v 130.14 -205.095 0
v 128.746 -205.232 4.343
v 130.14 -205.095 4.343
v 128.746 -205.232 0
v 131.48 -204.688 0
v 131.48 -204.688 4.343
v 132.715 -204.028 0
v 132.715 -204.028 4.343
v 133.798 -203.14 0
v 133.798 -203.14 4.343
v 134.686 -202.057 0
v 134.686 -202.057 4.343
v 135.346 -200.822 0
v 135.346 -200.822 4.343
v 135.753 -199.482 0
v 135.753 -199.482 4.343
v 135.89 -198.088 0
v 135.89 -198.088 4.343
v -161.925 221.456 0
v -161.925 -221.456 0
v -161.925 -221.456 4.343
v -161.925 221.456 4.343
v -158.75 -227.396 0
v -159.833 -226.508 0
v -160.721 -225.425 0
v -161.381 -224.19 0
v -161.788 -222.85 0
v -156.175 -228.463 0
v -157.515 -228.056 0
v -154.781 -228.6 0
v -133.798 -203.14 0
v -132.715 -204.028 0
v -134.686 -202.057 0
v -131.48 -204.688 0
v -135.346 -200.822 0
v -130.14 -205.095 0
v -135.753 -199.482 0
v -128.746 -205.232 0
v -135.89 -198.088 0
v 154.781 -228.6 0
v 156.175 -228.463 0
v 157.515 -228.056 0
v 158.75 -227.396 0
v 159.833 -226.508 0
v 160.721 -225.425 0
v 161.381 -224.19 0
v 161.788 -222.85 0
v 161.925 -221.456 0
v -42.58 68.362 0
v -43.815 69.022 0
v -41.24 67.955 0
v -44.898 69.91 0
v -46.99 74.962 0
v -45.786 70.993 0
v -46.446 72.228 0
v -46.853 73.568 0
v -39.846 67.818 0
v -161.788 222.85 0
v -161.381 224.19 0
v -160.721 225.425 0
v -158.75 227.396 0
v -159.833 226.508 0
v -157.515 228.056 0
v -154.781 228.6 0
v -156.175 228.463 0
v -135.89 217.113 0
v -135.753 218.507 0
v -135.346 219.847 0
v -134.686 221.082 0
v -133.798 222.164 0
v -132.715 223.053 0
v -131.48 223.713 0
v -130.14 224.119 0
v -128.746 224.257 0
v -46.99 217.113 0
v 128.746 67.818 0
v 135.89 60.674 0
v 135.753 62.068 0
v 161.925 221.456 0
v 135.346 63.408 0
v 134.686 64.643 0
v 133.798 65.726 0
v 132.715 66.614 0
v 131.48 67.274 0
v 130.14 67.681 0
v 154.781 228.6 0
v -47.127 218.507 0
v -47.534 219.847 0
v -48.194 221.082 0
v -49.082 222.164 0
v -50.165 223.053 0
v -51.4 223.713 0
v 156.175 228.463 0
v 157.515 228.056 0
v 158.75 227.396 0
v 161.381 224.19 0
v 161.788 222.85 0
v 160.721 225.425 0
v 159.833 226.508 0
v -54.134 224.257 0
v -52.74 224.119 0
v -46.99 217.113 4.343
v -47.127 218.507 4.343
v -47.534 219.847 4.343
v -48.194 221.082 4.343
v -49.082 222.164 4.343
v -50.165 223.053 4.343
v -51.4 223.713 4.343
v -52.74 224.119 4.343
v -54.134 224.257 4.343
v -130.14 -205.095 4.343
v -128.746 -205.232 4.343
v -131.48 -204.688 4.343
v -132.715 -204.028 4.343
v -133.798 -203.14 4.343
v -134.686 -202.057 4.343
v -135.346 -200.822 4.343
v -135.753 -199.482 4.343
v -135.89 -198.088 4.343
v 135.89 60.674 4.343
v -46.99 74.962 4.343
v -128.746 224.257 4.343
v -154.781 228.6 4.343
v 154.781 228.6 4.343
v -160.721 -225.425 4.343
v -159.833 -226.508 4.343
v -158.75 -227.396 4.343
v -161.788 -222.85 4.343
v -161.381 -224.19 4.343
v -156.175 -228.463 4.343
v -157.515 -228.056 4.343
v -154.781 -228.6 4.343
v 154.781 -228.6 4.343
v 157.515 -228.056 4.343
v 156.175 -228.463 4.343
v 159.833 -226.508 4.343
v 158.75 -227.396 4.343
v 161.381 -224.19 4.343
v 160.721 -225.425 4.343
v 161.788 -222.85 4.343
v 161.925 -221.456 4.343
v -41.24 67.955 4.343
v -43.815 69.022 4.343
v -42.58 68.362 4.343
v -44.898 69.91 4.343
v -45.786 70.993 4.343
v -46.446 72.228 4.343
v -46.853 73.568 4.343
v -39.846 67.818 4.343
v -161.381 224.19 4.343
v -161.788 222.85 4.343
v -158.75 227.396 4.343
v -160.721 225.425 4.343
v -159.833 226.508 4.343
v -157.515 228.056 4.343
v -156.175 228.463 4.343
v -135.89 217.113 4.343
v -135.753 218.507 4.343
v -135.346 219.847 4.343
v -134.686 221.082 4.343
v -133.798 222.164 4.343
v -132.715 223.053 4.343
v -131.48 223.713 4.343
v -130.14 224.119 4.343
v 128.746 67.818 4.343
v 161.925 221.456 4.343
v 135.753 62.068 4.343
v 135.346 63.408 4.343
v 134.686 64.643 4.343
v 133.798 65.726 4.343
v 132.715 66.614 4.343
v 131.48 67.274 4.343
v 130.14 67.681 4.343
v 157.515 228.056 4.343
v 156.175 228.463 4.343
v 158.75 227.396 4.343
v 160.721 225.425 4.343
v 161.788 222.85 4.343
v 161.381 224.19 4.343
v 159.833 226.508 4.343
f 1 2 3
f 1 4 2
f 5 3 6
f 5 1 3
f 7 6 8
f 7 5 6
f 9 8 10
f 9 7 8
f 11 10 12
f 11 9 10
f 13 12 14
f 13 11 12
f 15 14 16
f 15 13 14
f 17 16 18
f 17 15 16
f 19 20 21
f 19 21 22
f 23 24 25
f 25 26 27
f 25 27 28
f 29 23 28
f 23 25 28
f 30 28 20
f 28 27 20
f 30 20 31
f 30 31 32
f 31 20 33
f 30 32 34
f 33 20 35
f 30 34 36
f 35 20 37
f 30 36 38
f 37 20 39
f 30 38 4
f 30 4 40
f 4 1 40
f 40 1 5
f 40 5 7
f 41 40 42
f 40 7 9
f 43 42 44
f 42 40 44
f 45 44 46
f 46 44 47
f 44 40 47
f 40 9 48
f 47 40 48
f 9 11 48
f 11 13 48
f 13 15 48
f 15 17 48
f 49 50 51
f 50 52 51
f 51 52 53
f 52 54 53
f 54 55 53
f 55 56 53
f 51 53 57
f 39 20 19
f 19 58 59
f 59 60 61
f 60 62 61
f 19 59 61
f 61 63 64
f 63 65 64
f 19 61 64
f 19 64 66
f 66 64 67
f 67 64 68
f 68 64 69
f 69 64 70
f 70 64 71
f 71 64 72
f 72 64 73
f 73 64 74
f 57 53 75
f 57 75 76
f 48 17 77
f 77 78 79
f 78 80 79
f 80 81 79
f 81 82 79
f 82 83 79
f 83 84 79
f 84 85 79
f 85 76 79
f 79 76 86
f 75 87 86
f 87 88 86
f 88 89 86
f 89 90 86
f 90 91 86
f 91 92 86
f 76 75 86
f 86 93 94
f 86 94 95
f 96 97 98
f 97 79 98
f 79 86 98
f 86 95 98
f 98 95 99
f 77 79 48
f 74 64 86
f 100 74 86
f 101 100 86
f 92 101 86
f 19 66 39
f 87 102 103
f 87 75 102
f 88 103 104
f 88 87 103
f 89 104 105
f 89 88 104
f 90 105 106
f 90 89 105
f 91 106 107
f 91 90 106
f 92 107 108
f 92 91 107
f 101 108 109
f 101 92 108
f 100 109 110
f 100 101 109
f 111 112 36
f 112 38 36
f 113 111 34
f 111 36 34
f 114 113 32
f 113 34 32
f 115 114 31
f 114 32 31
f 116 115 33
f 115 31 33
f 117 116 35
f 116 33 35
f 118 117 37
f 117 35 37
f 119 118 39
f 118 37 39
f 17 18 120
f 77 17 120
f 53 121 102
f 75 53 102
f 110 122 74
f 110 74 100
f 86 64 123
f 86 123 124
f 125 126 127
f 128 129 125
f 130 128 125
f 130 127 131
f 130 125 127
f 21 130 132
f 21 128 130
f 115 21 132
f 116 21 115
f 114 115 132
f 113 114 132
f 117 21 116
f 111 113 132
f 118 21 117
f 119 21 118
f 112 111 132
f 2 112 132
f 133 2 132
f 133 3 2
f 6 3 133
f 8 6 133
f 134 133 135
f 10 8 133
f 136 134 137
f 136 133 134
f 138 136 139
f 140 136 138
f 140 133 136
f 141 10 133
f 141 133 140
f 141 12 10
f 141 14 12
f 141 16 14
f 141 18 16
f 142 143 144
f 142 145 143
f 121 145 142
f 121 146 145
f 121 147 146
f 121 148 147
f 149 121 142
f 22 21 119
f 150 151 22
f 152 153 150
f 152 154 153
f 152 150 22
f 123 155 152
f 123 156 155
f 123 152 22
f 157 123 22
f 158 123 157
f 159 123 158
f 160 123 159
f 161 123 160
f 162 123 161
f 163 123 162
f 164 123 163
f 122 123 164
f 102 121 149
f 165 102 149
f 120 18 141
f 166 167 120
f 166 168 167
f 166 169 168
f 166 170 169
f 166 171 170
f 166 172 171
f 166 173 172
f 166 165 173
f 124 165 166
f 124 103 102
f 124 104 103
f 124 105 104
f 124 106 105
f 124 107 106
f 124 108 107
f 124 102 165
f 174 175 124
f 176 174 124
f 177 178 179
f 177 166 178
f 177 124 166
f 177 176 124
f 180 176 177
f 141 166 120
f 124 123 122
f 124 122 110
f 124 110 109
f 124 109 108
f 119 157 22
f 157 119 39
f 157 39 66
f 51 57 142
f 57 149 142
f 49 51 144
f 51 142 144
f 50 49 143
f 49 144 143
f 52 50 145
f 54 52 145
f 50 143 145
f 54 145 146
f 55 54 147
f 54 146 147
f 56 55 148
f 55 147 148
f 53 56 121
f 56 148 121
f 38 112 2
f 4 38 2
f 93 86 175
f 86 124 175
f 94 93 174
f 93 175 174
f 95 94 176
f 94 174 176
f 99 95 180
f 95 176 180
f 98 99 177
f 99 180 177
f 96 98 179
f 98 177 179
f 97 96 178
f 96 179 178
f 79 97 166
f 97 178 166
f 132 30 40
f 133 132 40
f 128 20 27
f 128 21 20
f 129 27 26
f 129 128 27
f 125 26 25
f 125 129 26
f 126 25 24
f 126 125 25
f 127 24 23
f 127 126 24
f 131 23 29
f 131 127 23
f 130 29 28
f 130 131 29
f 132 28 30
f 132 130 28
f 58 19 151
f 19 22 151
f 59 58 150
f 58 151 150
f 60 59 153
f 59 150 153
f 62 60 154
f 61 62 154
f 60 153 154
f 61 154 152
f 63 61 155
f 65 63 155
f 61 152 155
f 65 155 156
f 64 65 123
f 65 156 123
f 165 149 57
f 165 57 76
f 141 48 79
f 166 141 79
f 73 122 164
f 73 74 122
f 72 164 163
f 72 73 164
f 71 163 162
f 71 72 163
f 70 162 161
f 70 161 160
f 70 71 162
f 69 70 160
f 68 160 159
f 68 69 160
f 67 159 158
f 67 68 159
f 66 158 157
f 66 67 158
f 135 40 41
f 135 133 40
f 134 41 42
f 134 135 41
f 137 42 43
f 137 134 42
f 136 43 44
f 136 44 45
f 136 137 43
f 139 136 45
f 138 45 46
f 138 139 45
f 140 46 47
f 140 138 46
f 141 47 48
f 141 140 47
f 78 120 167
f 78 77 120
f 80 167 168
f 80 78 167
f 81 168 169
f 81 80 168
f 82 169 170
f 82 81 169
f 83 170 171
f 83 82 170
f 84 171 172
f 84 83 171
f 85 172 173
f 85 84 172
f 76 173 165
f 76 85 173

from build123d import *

# Parameters (mm, degrees)
SKETCH1_W           = 323.85
SKETCH1_H           = 457.2
BOSS_EXTRUDE1_DEPTH = 4.3434
SKETCH2_W           = 271.78
SKETCH2_H           = 273.05
CUT_EXTRUDE1_DEPTH  = 5.3434
FILLET1_R           = 7.14375
SKETCH4_W           = 88.9
SKETCH4_H           = 184.911324328
CUT_EXTRUDE3_DEPTH  = 5.3434
FILLET2_R           = 7.14375


with BuildPart() as part:
    # Sketch1 → Boss-Extrude1 (new body)
    with BuildSketch(Plane.XY):
        Rectangle(SKETCH1_W, SKETCH1_H)
    extrude(amount=BOSS_EXTRUDE1_DEPTH)

    # Sketch2 → Cut-Extrude1 (cut, through all)
    with BuildSketch(Plane.XY.offset(4.3434)):
        with Locations((0, -68.707)):
            Rectangle(SKETCH2_W, SKETCH2_H)
    extrude(amount=-CUT_EXTRUDE1_DEPTH, mode=Mode.SUBTRACT)

    # Fillet1
    fillet1_edges = [part.edges().sort_by_distance(p)[0] for p in [
        (135.89, 67.818, 2.1717),
        (135.89, -205.232, 2.1717),
        (-135.89, -205.232, 2.1717),
        (-135.89, 67.818, 2.1717),
        (161.925, -228.6, 2.1717),
        (-161.925, -228.6, 2.1717),
        (-161.925, 228.6, 2.1717),
        (161.925, 228.6, 2.1717),
    ]]
    fillet(fillet1_edges, radius=FILLET1_R)

    # Sketch4 → Cut-Extrude3 (cut, through all)
    with BuildSketch(Plane.XY.offset(4.3434)):
        with Locations((-91.44, 131.800937836)):
            Rectangle(SKETCH4_W, SKETCH4_H)
    extrude(amount=-CUT_EXTRUDE3_DEPTH, mode=Mode.SUBTRACT)

    # Fillet2
    fillet2_edges = [part.edges().sort_by_distance(p)[0] for p in [
        (-46.99, 67.818, 2.1717),
        (-46.99, 224.2566, 2.1717),
        (-135.89, 224.2566, 2.1717),
    ]]
    fillet(fillet2_edges, radius=FILLET2_R)


solid = part.part
